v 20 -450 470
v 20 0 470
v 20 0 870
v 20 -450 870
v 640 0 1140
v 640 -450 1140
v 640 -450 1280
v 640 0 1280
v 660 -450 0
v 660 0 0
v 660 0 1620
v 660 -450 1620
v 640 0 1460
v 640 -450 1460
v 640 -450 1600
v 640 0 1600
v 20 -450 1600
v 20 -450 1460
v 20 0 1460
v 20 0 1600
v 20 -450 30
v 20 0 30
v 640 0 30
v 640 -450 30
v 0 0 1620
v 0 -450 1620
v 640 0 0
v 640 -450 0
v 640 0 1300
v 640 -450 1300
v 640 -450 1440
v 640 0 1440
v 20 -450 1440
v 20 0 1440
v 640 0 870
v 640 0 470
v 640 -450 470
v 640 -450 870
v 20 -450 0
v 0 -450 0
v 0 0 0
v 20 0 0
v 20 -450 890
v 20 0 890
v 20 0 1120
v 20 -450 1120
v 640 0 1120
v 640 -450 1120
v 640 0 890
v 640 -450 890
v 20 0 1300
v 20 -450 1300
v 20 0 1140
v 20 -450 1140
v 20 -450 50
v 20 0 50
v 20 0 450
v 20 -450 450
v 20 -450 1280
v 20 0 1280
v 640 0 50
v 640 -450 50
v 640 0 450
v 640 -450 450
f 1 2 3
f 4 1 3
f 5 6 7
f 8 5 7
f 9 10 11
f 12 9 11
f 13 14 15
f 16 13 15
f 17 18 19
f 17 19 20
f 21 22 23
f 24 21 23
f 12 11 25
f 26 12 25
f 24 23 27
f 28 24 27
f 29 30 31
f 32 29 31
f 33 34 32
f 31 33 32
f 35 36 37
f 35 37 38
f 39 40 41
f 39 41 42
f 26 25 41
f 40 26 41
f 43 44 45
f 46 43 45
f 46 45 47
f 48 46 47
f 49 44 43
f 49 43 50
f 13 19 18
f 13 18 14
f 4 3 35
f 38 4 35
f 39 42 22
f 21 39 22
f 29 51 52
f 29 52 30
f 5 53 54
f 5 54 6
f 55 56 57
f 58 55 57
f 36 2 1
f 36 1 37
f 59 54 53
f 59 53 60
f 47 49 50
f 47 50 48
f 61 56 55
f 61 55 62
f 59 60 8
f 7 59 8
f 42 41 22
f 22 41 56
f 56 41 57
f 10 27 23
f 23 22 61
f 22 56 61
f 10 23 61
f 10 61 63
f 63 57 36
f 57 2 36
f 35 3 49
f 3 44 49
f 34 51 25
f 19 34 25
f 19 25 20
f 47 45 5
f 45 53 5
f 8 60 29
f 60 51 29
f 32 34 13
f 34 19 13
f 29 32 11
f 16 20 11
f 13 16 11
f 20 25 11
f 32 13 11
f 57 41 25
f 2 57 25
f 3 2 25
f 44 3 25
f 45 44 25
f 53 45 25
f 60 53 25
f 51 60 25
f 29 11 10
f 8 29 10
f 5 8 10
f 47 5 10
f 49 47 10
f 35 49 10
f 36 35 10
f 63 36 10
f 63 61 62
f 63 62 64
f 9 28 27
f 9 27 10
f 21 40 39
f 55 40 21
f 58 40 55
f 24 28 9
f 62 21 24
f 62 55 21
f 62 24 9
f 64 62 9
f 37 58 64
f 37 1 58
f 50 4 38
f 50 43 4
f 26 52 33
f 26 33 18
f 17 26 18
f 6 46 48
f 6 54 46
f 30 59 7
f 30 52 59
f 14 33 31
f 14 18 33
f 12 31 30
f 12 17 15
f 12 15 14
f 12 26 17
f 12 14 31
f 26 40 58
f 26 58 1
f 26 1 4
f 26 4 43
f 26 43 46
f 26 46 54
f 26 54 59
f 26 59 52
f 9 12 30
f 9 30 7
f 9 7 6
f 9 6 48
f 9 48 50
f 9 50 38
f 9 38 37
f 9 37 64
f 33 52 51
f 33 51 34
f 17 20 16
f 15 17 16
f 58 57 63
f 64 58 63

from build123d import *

# Parameters (mm, degrees)
F0_W     = 620
F0_H     = 400
F0_H_2   = 230
F0_H_3   = 140
F1_DEPTH = 450


with BuildPart() as f1:
    # F0 (on Front) → F1 (new body)
    with BuildSketch(Plane.XZ):
        Polygon((0, 1620), (0, 0), (20, 0), (20, 30), (640, 30), (640, 0), (660, 0), (660, 1620), align=None)
        with Locations((330, 250)):
            Rectangle(F0_W, F0_H, mode=Mode.SUBTRACT)
        with Locations((330, 670)):
            Rectangle(F0_W, F0_H, mode=Mode.SUBTRACT)
        with Locations((330, 1005)):
            Rectangle(F0_W, F0_H_2, mode=Mode.SUBTRACT)
        with Locations((330, 1210)):
            Rectangle(F0_W, F0_H_3, mode=Mode.SUBTRACT)
        with Locations((330, 1370)):
            Rectangle(F0_W, F0_H_3, mode=Mode.SUBTRACT)
        with Locations((330, 1530)):
            Rectangle(F0_W, F0_H_3, mode=Mode.SUBTRACT)
    extrude(amount=F1_DEPTH)


solid = f1.part
